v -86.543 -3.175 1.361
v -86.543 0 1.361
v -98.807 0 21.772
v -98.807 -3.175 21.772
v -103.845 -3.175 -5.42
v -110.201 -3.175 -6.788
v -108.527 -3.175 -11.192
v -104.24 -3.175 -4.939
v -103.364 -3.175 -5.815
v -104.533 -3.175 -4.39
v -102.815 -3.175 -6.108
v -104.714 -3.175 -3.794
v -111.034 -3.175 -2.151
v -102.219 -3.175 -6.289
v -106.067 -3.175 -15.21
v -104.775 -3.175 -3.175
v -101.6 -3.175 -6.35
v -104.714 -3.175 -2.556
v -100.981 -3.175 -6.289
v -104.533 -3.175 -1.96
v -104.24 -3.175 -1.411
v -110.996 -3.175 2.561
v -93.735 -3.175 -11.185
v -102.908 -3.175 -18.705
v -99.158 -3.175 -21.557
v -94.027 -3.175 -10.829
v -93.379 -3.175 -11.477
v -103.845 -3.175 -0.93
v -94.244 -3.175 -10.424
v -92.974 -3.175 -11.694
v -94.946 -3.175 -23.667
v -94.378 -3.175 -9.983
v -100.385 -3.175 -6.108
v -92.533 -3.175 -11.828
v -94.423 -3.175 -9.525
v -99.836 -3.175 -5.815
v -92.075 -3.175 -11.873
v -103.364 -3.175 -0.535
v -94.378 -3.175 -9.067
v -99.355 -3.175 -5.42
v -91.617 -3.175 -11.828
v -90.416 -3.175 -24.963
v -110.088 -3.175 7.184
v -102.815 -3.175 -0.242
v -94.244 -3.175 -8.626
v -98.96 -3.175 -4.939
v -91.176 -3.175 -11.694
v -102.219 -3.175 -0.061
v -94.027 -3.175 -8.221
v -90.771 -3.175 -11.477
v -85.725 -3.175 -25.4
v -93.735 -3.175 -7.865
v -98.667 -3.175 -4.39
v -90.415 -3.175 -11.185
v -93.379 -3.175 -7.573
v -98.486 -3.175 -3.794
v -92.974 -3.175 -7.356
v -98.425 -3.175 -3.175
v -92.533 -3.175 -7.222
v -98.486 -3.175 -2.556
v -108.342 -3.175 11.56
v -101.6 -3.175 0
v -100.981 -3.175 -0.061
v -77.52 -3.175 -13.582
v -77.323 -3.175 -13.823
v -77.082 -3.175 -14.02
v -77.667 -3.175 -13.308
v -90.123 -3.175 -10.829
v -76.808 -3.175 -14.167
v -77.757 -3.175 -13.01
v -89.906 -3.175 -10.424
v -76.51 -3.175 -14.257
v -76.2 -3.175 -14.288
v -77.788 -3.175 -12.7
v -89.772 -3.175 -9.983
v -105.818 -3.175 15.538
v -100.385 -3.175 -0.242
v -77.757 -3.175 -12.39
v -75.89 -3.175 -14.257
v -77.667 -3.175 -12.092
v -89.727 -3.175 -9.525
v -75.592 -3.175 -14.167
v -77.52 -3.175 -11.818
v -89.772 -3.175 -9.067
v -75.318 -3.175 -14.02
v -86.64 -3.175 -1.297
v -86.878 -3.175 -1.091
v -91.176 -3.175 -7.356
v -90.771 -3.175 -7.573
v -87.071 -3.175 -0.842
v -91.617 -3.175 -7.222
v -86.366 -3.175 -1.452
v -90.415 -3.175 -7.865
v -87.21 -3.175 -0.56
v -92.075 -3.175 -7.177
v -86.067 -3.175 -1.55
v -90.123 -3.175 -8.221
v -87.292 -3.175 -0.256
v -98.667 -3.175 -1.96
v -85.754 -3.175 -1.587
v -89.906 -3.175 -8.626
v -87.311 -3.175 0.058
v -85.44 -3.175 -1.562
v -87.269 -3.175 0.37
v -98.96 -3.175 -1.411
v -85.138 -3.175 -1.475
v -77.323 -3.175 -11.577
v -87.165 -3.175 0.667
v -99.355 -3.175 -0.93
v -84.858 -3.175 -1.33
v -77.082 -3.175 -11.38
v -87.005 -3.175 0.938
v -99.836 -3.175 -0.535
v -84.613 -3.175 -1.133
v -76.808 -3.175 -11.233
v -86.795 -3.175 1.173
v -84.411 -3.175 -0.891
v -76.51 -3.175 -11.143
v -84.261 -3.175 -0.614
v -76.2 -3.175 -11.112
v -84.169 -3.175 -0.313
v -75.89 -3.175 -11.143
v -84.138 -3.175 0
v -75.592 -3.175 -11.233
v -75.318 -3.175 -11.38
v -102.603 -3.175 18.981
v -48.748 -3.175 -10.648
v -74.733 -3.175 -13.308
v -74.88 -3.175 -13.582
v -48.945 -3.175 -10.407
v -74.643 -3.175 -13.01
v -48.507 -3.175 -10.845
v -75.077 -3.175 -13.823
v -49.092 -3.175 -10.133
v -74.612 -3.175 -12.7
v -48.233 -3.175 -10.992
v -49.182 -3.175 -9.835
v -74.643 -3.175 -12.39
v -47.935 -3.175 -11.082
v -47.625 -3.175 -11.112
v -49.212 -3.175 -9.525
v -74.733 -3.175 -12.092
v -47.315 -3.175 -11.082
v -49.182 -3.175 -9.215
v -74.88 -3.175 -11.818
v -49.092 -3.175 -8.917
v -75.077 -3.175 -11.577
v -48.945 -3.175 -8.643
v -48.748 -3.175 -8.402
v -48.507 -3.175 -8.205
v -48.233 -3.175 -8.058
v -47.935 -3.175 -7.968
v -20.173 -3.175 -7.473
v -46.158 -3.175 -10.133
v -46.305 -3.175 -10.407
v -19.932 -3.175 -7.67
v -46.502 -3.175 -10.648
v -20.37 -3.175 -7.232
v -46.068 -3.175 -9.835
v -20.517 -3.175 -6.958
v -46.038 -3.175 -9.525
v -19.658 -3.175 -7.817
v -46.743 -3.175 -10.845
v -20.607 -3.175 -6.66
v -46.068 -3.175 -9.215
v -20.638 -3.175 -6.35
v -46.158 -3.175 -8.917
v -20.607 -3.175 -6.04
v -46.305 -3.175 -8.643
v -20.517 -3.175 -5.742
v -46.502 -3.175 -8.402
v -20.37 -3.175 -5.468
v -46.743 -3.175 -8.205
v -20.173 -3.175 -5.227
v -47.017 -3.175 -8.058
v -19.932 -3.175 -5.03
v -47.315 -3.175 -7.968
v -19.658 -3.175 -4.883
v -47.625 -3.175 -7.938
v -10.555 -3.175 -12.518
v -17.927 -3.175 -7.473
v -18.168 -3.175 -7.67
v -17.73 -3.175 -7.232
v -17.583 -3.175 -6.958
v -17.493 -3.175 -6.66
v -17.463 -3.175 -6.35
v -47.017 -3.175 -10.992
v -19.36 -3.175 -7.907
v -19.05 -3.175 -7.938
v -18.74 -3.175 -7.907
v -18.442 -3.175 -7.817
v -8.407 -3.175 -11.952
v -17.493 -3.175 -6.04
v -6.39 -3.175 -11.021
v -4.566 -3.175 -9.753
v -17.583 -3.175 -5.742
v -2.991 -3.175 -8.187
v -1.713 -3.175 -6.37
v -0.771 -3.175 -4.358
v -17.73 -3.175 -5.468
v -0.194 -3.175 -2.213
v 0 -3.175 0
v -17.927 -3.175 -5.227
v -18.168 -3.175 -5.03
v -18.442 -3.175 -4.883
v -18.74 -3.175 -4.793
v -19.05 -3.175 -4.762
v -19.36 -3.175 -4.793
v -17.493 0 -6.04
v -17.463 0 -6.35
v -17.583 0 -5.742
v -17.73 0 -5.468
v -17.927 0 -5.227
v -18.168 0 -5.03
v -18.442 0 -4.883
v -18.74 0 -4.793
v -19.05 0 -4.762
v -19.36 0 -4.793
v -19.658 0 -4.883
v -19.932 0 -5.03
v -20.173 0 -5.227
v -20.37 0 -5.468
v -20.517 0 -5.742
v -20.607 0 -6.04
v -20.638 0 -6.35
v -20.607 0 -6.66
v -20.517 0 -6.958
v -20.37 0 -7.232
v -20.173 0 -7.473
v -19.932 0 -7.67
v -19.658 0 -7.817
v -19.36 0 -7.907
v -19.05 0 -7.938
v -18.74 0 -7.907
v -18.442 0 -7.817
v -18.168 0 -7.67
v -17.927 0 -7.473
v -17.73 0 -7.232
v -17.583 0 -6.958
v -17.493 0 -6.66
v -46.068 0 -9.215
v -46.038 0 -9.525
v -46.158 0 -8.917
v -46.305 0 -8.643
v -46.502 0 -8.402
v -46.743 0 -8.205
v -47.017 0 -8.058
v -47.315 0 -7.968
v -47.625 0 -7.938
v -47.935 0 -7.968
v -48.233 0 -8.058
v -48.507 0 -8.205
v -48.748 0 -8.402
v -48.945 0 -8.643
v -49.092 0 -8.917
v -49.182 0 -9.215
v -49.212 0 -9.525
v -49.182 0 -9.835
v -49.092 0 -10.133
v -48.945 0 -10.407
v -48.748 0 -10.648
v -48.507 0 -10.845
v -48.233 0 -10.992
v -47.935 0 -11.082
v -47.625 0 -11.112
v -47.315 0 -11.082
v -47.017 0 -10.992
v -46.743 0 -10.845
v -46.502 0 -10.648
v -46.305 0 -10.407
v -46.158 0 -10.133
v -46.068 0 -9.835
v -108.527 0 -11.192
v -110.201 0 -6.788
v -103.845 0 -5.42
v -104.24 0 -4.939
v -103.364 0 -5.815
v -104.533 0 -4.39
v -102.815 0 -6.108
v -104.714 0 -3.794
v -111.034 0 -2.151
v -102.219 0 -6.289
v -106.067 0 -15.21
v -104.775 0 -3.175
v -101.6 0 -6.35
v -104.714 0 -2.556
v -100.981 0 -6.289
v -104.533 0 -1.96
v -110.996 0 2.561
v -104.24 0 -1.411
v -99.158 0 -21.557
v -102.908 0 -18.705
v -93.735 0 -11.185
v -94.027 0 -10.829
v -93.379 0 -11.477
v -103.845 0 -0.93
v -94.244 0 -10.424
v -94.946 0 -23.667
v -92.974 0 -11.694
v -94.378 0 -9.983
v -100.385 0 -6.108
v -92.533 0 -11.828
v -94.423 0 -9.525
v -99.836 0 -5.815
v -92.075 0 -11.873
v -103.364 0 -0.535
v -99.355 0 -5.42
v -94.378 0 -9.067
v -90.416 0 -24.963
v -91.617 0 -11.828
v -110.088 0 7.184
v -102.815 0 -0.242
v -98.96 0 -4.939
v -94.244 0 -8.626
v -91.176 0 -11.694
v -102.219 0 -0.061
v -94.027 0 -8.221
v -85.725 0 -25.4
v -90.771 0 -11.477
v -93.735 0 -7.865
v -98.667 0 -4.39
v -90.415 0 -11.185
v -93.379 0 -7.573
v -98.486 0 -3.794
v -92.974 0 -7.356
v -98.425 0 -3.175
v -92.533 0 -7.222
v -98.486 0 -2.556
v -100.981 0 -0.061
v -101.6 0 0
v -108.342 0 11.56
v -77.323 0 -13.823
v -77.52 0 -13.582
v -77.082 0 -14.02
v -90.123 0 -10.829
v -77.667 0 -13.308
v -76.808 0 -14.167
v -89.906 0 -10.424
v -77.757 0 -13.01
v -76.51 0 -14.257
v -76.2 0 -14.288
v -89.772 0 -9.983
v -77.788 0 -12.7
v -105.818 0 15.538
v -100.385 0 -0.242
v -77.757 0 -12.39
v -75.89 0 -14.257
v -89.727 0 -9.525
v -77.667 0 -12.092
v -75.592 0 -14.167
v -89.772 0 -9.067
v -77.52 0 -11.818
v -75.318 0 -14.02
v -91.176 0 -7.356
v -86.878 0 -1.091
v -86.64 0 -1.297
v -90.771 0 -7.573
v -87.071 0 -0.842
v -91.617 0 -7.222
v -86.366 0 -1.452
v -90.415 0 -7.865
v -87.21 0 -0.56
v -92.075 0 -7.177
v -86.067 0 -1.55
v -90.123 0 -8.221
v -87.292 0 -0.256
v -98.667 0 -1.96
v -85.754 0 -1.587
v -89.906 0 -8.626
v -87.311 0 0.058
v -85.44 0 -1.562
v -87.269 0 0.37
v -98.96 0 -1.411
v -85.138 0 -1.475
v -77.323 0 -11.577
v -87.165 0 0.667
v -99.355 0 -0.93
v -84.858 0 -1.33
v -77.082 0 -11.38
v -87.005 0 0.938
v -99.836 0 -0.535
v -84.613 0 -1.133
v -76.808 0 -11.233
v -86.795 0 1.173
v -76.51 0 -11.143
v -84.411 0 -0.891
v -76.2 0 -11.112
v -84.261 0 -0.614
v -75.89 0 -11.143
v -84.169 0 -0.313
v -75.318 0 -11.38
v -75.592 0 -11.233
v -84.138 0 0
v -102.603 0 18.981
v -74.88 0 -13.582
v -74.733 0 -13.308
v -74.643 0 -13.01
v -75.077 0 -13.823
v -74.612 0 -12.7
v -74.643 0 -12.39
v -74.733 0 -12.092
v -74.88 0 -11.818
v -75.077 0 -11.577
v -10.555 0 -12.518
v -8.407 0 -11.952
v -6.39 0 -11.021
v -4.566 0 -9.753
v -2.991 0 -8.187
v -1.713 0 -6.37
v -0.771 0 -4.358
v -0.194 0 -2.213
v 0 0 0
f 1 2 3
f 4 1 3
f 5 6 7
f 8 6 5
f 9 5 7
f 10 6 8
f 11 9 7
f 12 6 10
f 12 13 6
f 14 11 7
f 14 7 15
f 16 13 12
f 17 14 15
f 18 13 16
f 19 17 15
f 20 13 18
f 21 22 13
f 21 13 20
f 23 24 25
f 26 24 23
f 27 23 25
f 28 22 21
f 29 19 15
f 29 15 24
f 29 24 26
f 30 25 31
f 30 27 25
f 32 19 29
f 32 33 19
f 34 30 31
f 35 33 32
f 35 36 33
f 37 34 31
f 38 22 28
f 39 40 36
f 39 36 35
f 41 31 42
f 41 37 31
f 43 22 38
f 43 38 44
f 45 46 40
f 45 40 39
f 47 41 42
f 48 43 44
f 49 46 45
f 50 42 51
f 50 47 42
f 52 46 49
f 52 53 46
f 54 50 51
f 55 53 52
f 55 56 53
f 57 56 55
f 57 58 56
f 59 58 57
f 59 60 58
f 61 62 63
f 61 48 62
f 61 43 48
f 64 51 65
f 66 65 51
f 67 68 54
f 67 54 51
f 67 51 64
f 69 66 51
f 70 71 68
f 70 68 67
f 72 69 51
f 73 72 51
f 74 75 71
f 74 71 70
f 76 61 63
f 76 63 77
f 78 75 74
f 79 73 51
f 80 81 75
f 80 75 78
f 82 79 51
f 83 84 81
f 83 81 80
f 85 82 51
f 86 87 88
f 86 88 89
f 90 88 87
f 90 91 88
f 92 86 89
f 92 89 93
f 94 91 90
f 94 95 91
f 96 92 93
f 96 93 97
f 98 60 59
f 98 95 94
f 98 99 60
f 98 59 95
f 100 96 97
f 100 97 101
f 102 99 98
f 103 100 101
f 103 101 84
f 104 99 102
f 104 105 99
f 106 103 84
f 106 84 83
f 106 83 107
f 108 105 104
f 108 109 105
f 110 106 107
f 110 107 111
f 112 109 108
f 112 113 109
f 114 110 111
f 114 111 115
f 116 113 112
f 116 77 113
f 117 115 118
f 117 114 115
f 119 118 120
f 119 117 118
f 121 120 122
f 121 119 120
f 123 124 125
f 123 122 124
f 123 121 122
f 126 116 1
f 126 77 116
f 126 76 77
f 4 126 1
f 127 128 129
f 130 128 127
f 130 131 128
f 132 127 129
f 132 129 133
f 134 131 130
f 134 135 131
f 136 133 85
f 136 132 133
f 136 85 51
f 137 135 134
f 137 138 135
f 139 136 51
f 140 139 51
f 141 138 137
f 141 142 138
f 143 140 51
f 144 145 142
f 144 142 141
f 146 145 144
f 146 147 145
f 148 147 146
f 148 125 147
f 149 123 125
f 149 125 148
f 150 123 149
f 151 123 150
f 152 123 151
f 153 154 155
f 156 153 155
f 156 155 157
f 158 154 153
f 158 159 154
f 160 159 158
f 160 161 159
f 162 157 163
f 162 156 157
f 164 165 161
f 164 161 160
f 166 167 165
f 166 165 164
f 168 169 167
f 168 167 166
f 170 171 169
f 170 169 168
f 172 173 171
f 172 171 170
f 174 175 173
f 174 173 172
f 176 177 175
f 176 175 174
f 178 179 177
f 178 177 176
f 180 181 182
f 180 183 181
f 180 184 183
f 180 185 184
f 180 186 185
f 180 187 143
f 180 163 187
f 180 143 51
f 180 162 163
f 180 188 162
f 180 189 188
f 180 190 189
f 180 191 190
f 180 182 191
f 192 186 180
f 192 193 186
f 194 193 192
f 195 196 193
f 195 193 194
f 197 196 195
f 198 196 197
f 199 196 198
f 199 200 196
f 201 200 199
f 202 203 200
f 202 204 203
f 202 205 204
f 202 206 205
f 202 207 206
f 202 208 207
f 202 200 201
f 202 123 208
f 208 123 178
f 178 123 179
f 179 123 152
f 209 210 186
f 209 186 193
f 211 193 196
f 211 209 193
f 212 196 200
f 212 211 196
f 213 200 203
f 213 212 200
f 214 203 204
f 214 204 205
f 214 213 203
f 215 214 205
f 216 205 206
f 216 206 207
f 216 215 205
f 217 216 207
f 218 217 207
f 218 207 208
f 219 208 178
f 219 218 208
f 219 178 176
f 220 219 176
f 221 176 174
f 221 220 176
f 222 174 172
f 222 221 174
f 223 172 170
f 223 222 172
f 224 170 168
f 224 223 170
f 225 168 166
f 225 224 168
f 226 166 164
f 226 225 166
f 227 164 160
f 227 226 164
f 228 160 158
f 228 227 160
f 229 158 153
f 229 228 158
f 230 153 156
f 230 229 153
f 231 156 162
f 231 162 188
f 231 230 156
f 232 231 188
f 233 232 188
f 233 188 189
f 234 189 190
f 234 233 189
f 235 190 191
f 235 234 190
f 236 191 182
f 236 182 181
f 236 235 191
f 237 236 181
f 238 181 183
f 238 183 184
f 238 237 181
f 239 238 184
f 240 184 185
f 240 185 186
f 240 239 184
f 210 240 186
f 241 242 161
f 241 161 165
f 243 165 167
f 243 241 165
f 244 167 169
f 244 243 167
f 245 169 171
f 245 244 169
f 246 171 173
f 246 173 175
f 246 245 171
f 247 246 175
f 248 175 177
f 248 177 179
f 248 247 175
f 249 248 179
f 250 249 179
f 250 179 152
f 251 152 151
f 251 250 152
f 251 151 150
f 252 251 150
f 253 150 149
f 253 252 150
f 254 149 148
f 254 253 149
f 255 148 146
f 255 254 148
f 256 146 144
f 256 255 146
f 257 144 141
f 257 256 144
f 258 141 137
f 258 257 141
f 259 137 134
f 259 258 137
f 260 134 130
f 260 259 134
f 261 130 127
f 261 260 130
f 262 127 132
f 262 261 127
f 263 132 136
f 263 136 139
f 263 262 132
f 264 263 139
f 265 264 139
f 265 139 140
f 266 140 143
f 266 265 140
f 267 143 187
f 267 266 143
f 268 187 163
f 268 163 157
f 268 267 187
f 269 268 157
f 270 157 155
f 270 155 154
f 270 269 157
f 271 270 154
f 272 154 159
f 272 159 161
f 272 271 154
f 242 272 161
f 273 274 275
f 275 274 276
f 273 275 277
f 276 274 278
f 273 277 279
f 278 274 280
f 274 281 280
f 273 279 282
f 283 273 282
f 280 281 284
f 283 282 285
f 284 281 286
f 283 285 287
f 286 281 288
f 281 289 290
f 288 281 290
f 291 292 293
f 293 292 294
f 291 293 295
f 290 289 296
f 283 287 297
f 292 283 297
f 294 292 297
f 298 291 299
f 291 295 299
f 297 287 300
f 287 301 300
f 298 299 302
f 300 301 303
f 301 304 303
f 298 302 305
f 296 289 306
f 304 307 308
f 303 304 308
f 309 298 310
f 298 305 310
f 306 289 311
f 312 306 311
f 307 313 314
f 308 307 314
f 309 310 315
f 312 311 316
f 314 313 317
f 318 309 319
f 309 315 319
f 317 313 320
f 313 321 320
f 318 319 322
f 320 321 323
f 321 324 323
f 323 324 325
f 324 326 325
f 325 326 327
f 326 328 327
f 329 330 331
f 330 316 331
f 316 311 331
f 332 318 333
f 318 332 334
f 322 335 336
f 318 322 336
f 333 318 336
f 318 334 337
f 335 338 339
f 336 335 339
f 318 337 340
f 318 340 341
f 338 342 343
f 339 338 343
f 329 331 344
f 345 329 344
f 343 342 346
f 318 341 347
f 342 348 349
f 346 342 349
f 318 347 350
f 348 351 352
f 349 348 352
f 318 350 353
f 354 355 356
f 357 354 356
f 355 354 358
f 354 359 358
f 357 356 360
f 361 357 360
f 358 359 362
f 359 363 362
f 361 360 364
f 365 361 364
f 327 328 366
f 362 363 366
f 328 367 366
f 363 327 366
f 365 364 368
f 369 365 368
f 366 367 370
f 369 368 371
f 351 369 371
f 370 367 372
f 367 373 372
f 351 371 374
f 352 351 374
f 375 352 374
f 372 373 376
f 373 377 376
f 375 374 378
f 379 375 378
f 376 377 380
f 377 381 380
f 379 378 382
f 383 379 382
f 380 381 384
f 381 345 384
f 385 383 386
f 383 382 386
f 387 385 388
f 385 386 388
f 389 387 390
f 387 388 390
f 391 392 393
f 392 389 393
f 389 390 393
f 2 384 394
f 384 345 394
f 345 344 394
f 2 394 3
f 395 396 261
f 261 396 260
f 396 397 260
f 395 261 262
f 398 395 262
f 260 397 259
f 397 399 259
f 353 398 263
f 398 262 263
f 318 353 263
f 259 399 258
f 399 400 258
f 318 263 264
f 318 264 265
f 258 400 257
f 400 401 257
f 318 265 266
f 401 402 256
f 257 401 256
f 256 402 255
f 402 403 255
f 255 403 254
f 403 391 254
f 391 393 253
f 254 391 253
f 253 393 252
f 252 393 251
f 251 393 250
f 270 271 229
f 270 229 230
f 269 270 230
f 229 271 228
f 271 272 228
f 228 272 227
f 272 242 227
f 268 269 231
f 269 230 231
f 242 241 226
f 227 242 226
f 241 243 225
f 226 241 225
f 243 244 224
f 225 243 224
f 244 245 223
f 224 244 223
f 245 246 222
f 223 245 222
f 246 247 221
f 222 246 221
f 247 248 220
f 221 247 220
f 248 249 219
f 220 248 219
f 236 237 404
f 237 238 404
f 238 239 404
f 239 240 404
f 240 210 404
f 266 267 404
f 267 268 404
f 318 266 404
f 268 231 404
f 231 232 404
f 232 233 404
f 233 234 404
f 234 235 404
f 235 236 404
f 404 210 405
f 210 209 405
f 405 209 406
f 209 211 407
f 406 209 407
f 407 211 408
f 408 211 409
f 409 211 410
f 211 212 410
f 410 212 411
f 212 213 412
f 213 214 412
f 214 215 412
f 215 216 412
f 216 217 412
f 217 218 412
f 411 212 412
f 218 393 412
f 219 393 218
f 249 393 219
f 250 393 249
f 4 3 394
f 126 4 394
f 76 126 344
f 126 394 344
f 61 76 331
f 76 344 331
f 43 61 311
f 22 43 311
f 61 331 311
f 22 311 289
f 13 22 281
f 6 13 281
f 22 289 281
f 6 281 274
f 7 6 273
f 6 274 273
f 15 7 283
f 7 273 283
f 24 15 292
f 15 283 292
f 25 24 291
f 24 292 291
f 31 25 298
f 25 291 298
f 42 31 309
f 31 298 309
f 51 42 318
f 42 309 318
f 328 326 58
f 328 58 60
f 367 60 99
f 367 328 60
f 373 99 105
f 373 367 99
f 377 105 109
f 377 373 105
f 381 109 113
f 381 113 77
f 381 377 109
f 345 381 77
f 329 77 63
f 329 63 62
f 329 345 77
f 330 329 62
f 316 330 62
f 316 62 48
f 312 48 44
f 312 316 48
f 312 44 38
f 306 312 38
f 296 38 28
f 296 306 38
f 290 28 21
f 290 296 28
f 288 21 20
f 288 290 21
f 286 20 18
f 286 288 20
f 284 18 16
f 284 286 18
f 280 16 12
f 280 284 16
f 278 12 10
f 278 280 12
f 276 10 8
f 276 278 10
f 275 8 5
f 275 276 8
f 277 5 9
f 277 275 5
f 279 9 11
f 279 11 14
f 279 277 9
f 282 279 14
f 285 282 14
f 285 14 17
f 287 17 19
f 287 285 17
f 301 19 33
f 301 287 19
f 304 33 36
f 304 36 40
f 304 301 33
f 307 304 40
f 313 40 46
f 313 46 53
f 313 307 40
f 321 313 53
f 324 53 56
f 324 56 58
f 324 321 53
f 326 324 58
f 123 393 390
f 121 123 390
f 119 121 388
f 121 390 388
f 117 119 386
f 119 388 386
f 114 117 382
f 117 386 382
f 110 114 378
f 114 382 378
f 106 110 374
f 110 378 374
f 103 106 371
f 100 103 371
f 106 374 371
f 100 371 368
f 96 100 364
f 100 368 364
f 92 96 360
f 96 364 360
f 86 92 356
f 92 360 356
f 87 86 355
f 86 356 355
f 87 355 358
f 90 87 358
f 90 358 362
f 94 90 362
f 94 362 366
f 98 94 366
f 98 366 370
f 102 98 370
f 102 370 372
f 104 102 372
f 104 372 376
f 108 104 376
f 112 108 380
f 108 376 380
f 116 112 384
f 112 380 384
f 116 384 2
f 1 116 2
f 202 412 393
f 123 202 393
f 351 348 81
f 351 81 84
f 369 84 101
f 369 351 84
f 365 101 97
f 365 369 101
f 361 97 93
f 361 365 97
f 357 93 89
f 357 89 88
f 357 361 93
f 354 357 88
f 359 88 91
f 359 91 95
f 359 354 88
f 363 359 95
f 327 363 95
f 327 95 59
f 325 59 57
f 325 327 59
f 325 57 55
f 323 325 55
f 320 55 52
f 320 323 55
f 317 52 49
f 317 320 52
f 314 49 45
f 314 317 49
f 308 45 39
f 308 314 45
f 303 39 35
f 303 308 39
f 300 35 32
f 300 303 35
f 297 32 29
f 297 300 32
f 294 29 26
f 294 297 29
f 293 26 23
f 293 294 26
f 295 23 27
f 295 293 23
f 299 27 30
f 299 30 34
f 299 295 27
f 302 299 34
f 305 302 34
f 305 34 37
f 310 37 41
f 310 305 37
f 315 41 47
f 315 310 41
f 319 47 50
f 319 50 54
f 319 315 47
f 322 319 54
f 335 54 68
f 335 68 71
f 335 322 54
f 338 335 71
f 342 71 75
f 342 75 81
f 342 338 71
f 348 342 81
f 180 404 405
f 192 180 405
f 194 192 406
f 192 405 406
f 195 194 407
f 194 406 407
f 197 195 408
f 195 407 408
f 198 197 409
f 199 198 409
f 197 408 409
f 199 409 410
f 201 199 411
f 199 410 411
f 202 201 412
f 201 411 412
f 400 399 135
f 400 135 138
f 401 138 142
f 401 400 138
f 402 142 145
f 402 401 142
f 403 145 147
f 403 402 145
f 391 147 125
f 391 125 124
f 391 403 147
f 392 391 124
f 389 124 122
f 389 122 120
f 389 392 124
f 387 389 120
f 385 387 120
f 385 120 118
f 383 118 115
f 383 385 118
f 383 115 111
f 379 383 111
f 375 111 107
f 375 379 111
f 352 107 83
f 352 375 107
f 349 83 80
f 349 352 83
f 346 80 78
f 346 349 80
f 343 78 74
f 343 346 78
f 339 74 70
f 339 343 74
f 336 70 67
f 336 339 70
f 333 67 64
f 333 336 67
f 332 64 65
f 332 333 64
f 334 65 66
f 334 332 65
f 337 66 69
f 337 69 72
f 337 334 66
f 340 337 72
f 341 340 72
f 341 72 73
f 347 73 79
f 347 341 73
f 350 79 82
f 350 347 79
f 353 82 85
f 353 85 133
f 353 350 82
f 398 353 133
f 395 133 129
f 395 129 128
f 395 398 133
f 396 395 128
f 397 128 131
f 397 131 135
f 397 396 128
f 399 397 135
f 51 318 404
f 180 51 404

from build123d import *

# Parameters (mm, degrees)
F0_R     = 2.347977
F0_R_2   = 3.175
F0_R_3   = 1.5875
F1_DEPTH = 3.175


with BuildPart() as f1:
    # F0 (on Front) → F1 (new body)
    with BuildSketch(Plane.XZ):
        with BuildLine():
            Line((-85.725, -25.4), (-10.55478, -12.517509))
            ThreePointArc((-10.55478, -12.517509), (-2.990873, -8.186748), (0, 0))
            Line((0, 0), (-84.1375, 0))
            ThreePointArc((-84.1375, 0), (-86.506722, -1.38169), (-86.542623, 1.360753))
            Line((-86.542623, 1.360753), (-98.806967, 21.772049))
            ThreePointArc((-98.806967, 21.772049), (-110.201214, -6.787855), (-85.725, -25.4))
        make_face()
        with Locations((-92.075, -9.525)):
            Circle(F0_R, mode=Mode.SUBTRACT)
        with Locations((-101.6, -3.175)):
            Circle(F0_R_2, mode=Mode.SUBTRACT)
        with Locations((-76.2, -12.7)):
            Circle(F0_R_3, mode=Mode.SUBTRACT)
        with Locations((-47.625, -9.525)):
            Circle(F0_R_3, mode=Mode.SUBTRACT)
        with Locations((-19.05, -6.35)):
            Circle(F0_R_3, mode=Mode.SUBTRACT)
    extrude(amount=F1_DEPTH)


solid = f1.part
